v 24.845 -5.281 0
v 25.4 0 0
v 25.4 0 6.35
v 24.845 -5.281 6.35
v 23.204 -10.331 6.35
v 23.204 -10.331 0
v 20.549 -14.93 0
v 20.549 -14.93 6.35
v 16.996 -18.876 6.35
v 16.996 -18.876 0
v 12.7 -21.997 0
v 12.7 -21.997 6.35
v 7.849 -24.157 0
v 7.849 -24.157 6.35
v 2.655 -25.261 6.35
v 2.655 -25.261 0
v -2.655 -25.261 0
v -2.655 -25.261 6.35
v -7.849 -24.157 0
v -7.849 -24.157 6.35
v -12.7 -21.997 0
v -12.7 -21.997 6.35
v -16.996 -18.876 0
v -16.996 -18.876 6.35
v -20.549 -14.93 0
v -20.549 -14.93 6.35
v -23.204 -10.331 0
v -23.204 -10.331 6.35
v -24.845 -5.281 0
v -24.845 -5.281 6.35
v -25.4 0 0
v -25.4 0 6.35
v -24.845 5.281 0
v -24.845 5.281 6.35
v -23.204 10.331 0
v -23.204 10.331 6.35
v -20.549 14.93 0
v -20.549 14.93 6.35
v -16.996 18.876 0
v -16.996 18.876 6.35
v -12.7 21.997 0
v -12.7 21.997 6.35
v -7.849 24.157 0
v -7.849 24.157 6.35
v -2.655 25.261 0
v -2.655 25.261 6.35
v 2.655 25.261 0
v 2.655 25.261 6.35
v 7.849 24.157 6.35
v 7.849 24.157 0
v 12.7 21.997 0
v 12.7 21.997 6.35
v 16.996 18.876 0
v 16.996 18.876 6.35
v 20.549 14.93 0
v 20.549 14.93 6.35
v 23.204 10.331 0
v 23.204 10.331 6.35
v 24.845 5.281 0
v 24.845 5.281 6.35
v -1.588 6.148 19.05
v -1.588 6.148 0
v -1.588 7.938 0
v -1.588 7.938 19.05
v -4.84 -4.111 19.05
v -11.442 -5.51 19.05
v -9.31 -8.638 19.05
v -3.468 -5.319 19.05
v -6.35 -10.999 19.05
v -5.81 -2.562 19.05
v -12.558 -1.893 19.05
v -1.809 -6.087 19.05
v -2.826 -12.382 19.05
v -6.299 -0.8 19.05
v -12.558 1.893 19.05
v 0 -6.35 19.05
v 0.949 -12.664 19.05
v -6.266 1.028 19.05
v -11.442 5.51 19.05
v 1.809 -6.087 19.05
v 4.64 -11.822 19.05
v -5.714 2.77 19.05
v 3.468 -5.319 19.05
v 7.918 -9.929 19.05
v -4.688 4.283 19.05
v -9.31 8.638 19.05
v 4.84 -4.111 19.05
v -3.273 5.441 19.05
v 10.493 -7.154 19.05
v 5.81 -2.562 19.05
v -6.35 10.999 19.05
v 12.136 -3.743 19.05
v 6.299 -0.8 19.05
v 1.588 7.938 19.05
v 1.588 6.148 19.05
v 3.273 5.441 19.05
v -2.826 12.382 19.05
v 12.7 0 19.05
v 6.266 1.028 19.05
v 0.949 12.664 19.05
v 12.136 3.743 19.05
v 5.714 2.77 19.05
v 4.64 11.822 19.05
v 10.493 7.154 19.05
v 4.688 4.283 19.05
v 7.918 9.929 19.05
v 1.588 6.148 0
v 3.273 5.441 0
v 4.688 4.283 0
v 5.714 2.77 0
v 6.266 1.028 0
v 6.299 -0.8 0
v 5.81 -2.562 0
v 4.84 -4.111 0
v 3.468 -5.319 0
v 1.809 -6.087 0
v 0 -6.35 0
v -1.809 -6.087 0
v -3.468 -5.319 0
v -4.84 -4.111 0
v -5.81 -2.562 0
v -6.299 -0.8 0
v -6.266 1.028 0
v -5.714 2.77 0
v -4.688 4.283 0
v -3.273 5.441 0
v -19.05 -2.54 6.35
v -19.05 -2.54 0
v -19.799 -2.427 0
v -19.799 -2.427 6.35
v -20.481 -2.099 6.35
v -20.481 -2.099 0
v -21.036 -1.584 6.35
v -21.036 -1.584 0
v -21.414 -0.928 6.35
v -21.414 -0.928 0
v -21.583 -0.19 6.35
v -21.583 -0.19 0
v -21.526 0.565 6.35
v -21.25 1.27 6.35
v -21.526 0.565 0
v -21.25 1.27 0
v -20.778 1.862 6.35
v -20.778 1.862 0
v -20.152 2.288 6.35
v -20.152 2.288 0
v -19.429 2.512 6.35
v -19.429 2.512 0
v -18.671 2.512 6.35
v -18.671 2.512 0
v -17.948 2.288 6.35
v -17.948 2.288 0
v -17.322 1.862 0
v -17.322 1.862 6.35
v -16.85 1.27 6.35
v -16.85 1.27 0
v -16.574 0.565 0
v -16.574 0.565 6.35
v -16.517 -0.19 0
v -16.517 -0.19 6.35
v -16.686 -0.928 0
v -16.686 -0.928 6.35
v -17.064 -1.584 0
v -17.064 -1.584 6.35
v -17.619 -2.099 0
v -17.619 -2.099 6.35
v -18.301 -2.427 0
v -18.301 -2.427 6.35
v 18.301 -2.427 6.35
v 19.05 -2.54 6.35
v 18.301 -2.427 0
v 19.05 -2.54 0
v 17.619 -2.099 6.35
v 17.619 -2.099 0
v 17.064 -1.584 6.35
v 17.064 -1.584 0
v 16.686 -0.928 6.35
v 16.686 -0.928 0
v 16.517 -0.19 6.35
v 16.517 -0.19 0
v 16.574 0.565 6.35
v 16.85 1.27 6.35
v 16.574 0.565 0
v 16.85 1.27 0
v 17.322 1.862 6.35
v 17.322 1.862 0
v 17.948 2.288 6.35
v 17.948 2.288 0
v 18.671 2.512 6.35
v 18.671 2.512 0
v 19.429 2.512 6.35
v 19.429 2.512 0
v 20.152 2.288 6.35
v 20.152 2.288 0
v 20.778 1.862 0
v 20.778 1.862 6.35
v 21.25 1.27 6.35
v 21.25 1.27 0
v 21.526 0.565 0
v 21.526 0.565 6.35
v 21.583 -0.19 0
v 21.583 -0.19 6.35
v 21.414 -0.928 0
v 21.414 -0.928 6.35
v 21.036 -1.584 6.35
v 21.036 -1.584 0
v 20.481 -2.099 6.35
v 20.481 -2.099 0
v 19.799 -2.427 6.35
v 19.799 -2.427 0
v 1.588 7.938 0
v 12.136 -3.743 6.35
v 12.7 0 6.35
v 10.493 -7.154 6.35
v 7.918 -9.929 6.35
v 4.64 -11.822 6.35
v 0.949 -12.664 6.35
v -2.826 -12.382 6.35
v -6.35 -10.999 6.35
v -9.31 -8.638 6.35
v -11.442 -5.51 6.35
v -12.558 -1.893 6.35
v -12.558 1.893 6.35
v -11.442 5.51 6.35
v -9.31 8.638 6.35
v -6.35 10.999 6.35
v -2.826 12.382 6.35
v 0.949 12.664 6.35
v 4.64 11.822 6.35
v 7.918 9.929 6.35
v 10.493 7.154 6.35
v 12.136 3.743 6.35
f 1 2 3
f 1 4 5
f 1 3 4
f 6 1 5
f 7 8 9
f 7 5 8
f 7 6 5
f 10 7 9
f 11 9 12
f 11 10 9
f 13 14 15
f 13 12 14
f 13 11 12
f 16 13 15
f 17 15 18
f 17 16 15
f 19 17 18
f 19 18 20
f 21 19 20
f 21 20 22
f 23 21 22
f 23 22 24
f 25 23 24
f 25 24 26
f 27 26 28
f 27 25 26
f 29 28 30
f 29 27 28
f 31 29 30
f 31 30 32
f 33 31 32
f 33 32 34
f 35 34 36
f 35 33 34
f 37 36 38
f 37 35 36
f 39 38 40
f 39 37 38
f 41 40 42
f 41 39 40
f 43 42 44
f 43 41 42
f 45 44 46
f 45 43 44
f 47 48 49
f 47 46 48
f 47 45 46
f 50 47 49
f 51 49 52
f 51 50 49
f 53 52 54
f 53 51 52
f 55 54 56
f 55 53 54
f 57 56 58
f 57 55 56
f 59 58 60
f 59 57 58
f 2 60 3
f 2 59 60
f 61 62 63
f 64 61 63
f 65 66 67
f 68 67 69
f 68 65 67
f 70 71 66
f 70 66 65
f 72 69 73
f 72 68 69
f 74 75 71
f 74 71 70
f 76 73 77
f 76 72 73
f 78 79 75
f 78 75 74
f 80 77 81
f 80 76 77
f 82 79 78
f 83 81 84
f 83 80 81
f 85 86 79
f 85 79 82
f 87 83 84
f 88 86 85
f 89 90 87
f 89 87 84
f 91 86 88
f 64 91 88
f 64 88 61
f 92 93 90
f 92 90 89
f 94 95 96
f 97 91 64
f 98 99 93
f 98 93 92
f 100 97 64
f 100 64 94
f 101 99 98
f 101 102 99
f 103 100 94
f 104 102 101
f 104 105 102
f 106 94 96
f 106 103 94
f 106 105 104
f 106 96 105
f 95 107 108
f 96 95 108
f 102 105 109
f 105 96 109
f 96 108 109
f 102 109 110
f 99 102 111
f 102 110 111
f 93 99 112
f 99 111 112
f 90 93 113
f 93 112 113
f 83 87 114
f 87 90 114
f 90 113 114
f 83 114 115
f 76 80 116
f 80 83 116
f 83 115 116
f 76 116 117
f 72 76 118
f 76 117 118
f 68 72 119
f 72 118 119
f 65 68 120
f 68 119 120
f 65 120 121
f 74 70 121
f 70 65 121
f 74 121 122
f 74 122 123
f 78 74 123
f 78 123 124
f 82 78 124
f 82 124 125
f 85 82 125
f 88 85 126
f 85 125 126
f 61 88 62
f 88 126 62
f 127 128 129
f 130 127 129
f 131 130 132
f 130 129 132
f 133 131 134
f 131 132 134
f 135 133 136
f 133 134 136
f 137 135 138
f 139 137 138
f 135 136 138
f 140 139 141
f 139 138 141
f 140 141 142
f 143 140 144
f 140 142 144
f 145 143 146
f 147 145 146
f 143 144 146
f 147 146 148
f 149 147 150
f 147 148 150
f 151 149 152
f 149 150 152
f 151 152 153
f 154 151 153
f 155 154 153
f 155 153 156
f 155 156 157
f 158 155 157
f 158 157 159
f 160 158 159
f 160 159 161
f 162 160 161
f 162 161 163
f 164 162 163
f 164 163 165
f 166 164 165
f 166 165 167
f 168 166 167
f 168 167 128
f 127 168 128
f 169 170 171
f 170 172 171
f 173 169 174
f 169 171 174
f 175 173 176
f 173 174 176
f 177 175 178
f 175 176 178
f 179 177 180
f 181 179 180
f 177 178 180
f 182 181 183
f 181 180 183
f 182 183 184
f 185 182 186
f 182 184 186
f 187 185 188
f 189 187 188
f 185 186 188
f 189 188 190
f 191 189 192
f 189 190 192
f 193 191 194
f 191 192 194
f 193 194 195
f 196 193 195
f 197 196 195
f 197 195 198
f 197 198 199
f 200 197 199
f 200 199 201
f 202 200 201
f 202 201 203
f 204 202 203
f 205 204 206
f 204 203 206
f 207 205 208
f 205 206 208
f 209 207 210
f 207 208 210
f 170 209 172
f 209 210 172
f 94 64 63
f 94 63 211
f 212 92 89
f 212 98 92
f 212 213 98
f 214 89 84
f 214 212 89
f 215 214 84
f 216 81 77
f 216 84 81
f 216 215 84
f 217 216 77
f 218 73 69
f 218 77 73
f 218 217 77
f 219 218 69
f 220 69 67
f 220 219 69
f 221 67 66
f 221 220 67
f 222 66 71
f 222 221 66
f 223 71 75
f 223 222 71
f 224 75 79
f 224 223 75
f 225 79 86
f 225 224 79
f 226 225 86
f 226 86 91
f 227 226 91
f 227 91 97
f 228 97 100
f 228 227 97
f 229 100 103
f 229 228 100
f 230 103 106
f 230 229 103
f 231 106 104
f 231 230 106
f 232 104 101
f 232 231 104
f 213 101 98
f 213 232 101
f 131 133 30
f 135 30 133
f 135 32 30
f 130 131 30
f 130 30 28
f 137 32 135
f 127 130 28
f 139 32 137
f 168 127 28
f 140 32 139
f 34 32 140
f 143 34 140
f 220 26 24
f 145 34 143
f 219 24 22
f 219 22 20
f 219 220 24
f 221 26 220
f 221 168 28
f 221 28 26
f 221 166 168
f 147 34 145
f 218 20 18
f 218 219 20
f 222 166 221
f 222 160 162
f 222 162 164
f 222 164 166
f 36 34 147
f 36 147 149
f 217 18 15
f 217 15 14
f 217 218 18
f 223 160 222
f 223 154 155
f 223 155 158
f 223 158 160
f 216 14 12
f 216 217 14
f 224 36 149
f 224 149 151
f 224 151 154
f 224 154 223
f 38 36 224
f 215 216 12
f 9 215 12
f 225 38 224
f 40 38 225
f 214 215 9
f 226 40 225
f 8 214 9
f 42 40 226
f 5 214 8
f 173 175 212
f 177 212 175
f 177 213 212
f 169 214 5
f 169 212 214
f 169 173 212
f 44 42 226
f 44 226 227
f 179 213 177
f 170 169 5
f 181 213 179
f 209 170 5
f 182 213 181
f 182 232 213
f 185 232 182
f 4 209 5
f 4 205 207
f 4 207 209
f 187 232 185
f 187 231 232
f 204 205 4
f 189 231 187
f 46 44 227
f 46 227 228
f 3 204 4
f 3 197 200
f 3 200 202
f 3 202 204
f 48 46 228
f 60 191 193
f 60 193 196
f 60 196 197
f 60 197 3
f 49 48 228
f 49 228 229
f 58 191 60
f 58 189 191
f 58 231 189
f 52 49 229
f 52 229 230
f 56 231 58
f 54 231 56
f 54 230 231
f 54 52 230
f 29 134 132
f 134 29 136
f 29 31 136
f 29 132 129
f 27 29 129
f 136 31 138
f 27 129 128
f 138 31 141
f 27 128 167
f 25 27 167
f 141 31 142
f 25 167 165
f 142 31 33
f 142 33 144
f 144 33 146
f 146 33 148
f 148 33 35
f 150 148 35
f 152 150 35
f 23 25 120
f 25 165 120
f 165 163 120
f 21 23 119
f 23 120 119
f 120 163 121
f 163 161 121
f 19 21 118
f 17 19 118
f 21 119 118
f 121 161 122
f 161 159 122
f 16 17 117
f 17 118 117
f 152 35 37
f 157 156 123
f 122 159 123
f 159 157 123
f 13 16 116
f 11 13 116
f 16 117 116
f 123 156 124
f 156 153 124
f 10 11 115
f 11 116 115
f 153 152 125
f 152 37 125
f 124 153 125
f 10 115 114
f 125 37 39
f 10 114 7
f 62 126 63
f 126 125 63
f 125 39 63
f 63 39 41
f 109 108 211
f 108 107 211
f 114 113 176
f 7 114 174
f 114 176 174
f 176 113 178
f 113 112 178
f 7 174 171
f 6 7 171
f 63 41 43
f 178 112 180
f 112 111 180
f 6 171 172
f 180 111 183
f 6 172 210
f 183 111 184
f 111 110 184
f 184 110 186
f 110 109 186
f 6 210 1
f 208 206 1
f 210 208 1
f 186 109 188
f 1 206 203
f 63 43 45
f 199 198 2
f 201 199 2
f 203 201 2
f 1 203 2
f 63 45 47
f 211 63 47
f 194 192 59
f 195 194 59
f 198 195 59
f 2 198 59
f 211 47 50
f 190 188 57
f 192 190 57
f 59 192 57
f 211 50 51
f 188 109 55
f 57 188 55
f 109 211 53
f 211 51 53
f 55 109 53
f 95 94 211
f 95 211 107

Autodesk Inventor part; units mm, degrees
ref_plane "YZ Plane" through (0, 0, 0) normal (1, 0, 0) x (0, 1, 0)
ref_plane "XZ Plane" through (0, 0, 0) normal (0, 1, 0) x (-1, 0, 0)
ref_plane "XY Plane" through (0, 0, 0) normal (0, 0, 1) x (1, 0, 0)
sketch "Sketch1" plane through (0, 0, 0) normal (0, 0, 1) x (1, 0, 0)
  circle A0 centre (0, 0) radius 6.35
  circle A1 centre (0, 0) radius 25.4
  dimension "d0" = 12.7
  dimension "d1" = 50.8
extrude "Extrusion1" add sketch "Sketch1" along normal blind 6.35
sketch "Sketch2" plane through (0, 0, 6.35) normal (0, 0, 1) x (1, 0, 0)
  circle A0 centre (0, 0) radius 6.35
  circle A1 centre (0, 0) radius 12.7
  dimension "d4" = 12.7
  dimension "d5" = 25.4
extrude "Extrusion2" add sketch "Sketch2" along normal blind 12.7
sketch "Sketch3" plane through (0, 0, 19.05) normal (0, 0, 1) x (1, 0, 0)
  circle A0 centre (0, 0) radius 6.35 projected
  circle A1 centre (0, 0) radius 12.7 projected
  line L0 (1.5875, 4.7625) -> (-1.5875, 4.7625)
  line L1 (-1.5875, 4.7625) -> (-1.5875, 7.9375)
  line L2 (-1.5875, 7.9375) -> (1.5875, 7.9375)
  line L3 (1.5875, 7.9375) -> (1.5875, 4.7625)
  line L4 (1.5875, 4.7625) -> (-1.5875, 7.9375) construction
  line L5 (-1.5875, 4.7625) -> (1.5875, 7.9375) construction
  point P0 (0, 6.35)
  dimension "d8" = 3.175
  dimension "d9" = 3.175
extrude "Extrusion3" cut sketch "Sketch3" against normal blind 25.4 contours L3 L0 L1 A0 | A0 L1 L2 L3 picked at (0.1781, 5.2842)
sketch "Sketch4" plane through (0, 0, 6.35) normal (0, 0, 1) x (1, 0, 0)
  circle A0 centre (0, 0) radius 12.7 projected
  circle A1 centre (0, 0) radius 25.4 projected
  circle A2 centre (0, 0) radius 19.05 construction
  circle A3 centre (-19.05, 0) radius 2.413
  circle A4 centre (19.05, 0) radius 2.413
  dimension "d12" = 38.1
  dimension "d13" = 4.826
  dimension "d14" = 4.826
hole "Hole1" at (-19.05, 0, 6.35) at (19.05, 0, 6.35) direction (0, 0, -1) diameter 5.08 end through all
properties part number "Hub Connected to Steel Tubing - 0.5in. Diameter" material "Aluminum 6061"
